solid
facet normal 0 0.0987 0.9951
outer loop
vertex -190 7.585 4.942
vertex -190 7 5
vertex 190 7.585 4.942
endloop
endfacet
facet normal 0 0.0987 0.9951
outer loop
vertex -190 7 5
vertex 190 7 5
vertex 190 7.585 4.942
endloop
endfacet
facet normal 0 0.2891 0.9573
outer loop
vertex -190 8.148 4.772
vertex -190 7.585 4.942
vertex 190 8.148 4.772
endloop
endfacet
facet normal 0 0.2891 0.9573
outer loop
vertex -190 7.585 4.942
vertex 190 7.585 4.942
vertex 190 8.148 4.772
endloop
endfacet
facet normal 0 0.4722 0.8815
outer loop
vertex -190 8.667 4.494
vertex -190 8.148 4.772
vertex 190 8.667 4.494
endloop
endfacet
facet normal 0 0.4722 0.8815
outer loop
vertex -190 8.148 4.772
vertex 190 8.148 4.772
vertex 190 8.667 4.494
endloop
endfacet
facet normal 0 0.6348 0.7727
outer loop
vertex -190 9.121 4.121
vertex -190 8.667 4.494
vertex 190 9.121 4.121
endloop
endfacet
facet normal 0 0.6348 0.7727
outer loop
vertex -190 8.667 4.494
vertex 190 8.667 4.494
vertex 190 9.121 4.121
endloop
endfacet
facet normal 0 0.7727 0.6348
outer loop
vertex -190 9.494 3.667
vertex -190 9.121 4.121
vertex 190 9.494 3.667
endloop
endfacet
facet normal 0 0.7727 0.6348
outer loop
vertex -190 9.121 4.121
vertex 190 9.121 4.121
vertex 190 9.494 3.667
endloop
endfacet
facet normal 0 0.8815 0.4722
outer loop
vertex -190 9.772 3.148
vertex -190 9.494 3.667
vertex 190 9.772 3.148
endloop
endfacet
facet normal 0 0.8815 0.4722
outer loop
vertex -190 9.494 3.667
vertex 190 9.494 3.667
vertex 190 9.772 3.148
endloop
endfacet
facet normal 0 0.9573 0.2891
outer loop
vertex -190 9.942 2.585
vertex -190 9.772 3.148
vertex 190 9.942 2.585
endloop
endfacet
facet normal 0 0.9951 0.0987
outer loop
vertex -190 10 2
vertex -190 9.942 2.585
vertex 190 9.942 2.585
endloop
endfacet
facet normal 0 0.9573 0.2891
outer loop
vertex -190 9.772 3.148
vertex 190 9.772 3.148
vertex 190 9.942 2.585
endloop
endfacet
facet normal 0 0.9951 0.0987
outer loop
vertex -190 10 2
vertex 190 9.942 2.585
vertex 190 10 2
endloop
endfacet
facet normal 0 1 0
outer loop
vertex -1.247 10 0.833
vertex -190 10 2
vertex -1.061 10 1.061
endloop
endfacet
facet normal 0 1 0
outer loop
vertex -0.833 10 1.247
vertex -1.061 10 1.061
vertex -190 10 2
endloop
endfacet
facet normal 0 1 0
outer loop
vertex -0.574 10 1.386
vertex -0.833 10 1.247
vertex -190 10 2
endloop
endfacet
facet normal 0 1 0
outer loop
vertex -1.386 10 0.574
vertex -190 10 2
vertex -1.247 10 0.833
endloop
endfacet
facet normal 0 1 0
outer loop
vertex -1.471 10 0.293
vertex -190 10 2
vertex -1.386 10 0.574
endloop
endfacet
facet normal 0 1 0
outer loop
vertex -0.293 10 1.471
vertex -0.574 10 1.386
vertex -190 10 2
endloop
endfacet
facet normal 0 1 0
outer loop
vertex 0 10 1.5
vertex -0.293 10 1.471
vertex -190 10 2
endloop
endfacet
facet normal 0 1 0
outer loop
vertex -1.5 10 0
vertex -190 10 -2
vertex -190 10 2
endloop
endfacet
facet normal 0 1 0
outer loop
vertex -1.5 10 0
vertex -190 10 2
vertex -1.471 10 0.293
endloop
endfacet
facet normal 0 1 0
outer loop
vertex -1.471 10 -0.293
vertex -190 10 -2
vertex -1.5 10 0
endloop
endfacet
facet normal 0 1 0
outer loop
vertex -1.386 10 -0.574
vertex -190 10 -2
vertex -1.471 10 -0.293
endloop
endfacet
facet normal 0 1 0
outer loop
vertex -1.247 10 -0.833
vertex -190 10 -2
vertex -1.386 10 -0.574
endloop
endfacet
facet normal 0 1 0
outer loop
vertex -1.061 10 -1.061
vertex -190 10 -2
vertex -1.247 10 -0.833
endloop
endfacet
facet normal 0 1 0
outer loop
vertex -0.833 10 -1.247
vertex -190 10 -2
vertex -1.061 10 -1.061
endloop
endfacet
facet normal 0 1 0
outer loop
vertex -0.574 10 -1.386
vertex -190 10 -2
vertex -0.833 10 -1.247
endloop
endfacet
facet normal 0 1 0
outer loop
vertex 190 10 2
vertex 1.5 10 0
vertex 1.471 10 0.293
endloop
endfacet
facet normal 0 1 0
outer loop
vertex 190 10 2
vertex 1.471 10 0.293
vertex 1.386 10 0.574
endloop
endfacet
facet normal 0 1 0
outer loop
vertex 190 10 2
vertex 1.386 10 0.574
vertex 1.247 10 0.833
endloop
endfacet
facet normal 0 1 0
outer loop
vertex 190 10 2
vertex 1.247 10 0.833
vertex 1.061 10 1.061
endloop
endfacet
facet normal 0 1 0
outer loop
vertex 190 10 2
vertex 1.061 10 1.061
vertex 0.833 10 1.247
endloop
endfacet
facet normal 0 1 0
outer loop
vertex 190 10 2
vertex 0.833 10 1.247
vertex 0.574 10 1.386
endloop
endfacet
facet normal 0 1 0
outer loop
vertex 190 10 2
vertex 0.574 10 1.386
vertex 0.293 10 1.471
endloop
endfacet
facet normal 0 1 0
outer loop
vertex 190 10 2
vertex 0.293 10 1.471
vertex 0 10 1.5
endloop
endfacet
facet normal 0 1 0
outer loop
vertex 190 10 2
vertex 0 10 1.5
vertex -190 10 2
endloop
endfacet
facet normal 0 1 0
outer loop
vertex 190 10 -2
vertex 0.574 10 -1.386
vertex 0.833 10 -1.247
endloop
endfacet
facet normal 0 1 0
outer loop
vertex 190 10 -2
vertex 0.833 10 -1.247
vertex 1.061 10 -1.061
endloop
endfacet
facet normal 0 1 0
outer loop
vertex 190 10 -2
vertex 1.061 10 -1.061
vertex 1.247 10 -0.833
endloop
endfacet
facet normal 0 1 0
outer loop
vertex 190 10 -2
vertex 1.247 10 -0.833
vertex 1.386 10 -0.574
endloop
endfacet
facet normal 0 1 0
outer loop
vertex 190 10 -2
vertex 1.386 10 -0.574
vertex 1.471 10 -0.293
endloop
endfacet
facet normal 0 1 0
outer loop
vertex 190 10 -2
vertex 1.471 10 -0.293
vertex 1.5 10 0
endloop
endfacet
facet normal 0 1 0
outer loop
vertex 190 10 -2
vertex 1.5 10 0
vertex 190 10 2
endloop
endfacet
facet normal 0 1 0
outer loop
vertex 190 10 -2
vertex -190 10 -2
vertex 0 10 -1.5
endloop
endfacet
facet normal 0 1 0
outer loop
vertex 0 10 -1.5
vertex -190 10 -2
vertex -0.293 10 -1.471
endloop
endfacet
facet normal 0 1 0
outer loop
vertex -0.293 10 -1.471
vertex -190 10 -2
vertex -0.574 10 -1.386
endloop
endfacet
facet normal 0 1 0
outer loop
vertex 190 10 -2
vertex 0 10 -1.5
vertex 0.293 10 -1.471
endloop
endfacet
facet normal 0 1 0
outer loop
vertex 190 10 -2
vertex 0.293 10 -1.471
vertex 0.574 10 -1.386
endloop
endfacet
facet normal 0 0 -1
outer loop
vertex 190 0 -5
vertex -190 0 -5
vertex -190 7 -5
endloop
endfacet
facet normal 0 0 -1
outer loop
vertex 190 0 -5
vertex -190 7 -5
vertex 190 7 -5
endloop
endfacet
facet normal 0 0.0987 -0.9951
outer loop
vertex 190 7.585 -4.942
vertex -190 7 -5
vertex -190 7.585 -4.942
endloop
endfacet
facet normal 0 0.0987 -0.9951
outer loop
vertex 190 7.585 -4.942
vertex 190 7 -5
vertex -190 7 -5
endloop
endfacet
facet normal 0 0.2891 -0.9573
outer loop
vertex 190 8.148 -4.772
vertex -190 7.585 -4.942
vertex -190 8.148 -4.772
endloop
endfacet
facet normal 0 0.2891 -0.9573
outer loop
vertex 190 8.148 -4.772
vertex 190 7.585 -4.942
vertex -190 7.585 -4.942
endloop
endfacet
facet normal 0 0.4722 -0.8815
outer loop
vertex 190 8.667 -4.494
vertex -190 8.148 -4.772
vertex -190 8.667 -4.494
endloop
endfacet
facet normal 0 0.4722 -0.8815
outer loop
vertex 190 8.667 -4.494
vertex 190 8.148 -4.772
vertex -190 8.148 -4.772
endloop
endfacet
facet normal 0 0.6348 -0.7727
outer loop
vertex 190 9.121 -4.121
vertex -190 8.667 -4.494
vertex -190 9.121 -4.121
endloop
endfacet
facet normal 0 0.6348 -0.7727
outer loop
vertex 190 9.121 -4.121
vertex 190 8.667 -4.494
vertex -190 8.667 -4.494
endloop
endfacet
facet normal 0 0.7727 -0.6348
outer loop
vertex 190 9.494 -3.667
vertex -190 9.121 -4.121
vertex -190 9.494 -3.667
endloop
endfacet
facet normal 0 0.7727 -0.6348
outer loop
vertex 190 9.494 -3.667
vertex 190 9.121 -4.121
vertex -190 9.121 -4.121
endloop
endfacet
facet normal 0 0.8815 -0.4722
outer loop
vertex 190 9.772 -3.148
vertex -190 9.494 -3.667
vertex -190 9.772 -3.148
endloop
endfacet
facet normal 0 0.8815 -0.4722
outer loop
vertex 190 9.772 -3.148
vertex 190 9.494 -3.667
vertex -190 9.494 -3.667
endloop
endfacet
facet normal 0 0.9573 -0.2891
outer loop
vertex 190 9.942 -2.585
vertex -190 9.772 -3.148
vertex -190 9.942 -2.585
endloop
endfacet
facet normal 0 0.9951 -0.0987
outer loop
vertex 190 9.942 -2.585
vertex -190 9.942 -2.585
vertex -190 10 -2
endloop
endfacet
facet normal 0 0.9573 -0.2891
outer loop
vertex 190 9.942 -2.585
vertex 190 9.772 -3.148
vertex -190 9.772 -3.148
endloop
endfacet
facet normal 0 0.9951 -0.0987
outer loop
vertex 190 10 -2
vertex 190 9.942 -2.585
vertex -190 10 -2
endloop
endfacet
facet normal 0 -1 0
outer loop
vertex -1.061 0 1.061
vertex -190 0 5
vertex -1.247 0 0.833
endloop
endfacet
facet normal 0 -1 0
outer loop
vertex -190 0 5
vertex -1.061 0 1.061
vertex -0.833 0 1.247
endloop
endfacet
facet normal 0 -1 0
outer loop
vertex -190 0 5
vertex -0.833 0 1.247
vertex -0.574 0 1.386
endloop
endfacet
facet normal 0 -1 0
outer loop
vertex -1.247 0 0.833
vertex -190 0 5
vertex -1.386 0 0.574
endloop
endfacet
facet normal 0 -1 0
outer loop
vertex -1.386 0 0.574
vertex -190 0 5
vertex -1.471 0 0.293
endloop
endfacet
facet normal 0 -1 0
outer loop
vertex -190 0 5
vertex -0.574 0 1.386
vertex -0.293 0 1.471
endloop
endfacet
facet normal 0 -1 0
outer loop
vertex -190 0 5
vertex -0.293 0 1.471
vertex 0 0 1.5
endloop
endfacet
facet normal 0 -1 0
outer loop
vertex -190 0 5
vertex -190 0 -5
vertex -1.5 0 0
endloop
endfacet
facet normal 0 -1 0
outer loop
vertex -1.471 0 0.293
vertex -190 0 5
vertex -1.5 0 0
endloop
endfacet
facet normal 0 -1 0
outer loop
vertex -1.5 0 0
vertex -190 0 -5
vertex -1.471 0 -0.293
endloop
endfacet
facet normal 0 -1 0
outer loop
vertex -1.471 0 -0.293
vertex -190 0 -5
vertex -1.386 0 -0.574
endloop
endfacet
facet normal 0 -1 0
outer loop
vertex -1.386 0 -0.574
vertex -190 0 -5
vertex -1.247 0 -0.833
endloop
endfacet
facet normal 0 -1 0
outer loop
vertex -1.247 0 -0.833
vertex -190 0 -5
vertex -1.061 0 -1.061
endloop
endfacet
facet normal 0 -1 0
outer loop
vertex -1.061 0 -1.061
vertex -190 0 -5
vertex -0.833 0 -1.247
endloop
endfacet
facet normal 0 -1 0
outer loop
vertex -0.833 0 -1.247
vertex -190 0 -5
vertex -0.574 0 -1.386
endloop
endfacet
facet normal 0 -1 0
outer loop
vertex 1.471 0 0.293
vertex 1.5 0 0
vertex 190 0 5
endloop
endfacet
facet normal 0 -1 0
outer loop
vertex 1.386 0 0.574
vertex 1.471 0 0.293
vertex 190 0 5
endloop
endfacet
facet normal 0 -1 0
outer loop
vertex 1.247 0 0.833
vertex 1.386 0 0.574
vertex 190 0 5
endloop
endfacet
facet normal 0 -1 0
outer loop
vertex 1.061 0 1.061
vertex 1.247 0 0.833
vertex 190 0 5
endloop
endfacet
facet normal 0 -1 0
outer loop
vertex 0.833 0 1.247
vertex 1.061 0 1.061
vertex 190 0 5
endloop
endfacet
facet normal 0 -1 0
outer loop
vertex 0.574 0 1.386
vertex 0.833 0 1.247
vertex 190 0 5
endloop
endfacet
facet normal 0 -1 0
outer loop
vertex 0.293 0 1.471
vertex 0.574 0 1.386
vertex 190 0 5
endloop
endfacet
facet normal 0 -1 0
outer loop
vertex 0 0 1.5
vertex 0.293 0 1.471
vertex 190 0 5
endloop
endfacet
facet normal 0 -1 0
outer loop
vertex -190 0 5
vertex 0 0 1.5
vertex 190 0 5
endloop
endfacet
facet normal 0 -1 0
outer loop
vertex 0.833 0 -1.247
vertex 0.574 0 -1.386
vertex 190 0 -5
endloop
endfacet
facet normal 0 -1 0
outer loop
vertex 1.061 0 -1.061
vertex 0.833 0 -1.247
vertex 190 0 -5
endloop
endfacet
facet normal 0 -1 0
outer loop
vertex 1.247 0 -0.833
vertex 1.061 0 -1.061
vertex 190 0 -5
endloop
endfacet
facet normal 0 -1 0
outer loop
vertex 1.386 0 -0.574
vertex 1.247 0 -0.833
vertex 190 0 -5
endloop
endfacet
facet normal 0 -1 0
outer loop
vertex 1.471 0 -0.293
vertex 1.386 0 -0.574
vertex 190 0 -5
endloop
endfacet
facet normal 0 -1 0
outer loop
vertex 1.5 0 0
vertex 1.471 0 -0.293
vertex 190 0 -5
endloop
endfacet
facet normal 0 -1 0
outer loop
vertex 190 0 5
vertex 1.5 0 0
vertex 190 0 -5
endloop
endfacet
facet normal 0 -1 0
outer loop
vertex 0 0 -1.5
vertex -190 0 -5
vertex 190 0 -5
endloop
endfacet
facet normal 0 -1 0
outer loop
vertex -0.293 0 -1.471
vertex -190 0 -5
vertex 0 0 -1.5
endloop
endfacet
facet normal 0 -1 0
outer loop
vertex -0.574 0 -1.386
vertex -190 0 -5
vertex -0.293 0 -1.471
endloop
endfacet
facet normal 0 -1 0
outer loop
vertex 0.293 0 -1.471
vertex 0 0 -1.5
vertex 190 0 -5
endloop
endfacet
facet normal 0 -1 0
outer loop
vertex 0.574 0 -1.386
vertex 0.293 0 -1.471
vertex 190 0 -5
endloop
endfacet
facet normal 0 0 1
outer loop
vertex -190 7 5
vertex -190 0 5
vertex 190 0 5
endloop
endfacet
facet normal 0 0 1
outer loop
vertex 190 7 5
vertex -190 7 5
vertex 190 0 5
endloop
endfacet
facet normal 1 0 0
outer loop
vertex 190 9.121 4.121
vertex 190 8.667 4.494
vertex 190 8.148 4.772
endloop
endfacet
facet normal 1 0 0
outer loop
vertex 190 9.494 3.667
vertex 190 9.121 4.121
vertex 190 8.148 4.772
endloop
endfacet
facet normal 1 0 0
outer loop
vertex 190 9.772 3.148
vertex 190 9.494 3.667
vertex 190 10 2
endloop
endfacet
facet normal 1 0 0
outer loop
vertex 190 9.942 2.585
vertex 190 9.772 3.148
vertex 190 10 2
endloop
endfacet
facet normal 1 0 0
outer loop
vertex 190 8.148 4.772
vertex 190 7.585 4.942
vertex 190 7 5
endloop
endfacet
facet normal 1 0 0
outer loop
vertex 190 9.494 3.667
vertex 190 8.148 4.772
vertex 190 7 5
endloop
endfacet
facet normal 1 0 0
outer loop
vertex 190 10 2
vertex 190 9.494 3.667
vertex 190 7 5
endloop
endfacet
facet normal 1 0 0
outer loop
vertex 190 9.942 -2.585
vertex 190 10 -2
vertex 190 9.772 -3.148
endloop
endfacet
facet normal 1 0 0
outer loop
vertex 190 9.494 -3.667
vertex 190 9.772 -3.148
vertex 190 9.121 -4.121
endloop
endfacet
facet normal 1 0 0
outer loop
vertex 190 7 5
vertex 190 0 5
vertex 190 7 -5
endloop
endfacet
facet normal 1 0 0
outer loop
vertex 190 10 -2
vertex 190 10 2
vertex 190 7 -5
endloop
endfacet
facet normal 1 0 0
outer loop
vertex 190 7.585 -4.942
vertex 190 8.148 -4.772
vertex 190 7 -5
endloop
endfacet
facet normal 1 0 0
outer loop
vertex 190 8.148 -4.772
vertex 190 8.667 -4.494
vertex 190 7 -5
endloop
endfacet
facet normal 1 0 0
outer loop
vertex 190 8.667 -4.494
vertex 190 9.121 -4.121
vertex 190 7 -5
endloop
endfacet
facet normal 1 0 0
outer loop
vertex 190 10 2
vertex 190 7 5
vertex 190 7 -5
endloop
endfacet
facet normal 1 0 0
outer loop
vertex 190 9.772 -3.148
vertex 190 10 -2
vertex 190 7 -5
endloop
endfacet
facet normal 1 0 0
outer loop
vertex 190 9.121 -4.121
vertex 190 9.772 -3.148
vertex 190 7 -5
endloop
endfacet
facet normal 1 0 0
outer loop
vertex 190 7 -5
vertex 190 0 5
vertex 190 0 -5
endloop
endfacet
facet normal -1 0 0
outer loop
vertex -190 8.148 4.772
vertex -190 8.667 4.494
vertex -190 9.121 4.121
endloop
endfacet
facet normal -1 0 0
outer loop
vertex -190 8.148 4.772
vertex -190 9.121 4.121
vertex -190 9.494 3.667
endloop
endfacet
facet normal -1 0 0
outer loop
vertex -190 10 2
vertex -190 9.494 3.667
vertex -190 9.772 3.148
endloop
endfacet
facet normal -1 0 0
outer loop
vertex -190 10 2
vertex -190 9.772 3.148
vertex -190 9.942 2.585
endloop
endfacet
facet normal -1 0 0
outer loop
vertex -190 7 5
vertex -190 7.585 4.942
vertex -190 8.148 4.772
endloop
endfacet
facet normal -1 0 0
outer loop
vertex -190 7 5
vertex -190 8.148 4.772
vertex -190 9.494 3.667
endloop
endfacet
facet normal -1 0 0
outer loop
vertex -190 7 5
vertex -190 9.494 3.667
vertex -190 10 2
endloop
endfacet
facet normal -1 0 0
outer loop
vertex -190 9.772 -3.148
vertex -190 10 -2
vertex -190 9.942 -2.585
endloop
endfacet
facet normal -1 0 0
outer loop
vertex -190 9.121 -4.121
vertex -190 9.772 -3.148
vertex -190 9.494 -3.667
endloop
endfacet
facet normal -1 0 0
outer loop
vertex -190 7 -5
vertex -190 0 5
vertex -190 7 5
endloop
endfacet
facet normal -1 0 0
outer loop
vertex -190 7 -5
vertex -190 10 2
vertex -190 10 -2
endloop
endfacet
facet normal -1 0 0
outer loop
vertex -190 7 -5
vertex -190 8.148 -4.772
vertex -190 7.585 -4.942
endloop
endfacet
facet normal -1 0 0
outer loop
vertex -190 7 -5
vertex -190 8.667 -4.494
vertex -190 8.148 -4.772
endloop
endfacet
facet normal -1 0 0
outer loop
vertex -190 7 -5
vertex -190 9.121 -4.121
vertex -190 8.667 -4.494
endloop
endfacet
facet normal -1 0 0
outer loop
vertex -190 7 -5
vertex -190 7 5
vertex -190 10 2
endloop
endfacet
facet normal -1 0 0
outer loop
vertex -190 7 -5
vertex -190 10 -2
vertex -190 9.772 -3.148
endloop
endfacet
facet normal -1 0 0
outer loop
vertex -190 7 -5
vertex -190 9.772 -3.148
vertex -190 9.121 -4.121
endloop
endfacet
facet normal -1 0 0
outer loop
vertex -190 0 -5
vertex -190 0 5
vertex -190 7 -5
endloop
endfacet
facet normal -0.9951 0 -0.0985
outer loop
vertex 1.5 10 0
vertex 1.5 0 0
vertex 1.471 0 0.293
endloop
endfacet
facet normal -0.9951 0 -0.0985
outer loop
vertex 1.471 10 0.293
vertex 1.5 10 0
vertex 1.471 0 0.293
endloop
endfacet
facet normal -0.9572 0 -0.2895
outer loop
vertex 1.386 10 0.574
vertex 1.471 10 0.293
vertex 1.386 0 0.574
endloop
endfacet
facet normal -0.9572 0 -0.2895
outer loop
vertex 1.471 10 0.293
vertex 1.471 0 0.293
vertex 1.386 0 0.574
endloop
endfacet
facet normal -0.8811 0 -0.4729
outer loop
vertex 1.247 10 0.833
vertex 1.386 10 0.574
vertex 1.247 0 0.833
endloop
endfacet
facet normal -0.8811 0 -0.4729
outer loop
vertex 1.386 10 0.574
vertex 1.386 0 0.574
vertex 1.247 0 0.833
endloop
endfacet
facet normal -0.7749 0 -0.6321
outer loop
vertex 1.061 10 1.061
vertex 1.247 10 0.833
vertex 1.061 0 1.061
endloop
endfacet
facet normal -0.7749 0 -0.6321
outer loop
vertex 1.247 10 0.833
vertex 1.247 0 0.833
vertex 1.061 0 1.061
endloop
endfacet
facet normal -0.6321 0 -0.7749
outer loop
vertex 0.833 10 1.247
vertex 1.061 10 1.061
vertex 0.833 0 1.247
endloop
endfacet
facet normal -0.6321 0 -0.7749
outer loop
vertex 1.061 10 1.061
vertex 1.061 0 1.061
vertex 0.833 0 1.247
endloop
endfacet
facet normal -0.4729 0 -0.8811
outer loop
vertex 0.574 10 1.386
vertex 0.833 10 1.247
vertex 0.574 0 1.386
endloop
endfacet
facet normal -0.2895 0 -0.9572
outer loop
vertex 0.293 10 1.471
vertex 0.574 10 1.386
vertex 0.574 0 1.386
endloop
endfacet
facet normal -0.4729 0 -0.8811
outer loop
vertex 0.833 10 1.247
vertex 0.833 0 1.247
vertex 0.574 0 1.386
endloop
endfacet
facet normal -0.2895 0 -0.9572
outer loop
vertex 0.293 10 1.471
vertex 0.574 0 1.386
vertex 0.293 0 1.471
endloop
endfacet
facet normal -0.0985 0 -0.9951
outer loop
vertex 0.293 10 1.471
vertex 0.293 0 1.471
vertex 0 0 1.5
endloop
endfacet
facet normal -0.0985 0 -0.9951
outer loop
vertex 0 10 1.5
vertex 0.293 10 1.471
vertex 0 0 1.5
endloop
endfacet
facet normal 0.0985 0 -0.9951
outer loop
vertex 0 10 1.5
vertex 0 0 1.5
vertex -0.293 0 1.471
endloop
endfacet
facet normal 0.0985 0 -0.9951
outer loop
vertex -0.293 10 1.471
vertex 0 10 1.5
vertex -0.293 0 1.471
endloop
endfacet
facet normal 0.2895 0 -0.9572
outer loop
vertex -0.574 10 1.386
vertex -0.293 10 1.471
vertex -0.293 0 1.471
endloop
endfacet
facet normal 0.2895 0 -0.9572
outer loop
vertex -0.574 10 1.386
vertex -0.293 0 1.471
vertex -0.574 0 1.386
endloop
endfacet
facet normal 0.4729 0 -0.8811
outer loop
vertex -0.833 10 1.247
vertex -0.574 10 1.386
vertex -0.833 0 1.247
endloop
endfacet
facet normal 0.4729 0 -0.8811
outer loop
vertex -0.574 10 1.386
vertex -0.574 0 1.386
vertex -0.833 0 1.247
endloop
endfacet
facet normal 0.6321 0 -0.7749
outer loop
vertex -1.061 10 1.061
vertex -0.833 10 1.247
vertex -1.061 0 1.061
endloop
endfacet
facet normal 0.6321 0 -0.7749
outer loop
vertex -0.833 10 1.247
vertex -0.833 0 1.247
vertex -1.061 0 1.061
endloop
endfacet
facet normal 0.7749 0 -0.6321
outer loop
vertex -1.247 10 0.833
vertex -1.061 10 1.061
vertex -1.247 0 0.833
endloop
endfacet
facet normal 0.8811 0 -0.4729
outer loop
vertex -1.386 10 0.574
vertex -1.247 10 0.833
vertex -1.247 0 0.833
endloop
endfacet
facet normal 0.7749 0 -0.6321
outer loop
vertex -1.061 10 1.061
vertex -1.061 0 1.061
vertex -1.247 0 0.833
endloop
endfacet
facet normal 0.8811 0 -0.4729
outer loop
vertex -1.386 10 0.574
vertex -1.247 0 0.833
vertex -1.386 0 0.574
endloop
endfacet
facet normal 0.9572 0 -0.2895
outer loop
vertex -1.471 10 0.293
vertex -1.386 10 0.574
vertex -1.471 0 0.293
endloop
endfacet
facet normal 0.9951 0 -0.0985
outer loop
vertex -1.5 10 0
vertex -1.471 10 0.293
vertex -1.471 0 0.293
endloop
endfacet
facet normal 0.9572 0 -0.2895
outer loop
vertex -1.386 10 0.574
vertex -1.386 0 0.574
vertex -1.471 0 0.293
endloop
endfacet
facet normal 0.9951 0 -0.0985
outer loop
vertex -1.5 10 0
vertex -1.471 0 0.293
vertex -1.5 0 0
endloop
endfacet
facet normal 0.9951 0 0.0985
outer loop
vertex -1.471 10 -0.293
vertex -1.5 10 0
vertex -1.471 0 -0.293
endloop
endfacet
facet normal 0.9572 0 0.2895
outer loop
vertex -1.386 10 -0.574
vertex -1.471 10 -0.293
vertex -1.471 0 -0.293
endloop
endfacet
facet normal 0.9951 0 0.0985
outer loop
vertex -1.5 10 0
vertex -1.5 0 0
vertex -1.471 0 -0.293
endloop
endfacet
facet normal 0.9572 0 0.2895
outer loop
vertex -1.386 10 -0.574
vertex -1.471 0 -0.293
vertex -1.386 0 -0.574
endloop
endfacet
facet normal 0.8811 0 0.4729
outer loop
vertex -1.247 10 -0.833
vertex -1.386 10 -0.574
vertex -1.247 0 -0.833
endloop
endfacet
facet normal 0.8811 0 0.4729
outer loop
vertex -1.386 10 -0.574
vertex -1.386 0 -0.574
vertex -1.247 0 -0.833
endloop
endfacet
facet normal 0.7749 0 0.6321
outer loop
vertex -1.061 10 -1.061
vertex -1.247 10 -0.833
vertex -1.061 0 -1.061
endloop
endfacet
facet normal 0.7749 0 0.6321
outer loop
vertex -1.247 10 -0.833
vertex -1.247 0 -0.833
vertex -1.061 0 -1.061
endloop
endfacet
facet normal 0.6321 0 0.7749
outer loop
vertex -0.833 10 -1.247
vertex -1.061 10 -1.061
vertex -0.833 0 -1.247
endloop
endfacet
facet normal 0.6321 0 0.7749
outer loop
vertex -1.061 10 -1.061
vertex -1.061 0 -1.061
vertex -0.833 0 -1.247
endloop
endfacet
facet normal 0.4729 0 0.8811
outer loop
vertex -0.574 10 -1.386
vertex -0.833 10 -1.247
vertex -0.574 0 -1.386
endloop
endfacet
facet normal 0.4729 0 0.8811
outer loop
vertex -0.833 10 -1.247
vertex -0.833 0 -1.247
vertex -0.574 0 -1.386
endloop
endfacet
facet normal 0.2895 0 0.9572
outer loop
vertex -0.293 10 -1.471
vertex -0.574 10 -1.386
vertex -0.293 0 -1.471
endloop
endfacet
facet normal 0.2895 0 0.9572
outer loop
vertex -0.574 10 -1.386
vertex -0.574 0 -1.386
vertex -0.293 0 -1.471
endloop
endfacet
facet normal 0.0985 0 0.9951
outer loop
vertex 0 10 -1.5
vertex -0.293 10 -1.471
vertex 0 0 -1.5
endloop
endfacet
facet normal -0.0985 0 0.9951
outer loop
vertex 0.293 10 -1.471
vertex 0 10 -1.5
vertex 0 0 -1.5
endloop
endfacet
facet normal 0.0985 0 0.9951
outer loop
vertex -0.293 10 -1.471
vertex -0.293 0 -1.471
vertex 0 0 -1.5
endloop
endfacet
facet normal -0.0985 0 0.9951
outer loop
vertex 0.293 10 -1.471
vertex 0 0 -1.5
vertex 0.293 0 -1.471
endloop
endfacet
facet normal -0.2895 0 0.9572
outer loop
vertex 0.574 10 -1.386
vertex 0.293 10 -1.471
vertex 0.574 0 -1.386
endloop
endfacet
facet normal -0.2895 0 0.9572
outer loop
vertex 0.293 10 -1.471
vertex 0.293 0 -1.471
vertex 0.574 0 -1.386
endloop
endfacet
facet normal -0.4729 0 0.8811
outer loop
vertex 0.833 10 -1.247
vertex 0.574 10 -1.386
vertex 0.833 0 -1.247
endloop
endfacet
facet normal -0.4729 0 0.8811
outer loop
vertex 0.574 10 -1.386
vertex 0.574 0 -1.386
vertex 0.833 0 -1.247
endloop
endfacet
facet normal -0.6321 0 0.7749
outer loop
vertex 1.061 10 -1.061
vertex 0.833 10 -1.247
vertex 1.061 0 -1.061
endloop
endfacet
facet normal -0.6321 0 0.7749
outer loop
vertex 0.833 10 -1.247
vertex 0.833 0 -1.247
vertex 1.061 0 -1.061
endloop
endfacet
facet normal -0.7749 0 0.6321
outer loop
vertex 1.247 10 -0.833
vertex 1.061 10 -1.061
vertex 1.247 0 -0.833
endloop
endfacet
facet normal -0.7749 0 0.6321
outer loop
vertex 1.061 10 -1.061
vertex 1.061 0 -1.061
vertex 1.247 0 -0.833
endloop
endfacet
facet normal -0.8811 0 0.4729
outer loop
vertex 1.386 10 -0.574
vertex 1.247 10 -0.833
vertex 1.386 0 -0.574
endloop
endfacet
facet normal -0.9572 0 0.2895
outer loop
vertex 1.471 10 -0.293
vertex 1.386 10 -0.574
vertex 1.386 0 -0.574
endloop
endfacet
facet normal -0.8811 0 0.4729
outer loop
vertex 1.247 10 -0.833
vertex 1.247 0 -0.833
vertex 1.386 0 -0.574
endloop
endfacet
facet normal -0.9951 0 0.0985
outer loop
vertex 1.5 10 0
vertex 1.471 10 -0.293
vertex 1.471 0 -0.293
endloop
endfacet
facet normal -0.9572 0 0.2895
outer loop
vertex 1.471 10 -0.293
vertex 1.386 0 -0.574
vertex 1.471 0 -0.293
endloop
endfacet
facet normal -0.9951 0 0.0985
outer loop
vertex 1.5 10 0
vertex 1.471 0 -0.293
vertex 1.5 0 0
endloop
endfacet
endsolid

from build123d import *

# Parameters (mm, degrees)
SKETCH1_W           = 380
SKETCH1_H           = 10
BOSS_EXTRUDE1_DEPTH = 10
FILLET1_R           = 3
SKETCH2_R           = 1.5
CUT_EXTRUDE1_DEPTH  = 10


with BuildPart() as part:
    # Sketch1 → Boss-Extrude1 (new body)
    with BuildSketch(Plane(origin=(0, 0, 0), x_dir=(1, 0, 0), z_dir=(0, 1, 0))):
        Rectangle(SKETCH1_W, SKETCH1_H)
    extrude(amount=BOSS_EXTRUDE1_DEPTH)

    # Fillet1
    fillet1_edges = [part.edges().sort_by_distance(p)[0] for p in [
        (0, 10, 5),
        (0, 10, -5),
    ]]
    fillet(fillet1_edges, radius=FILLET1_R)

    # Sketch2 → Cut-Extrude1 (cut)
    with BuildSketch(Plane.XZ):
        Circle(SKETCH2_R)
    extrude(amount=-CUT_EXTRUDE1_DEPTH, mode=Mode.SUBTRACT)


solid = part.part
